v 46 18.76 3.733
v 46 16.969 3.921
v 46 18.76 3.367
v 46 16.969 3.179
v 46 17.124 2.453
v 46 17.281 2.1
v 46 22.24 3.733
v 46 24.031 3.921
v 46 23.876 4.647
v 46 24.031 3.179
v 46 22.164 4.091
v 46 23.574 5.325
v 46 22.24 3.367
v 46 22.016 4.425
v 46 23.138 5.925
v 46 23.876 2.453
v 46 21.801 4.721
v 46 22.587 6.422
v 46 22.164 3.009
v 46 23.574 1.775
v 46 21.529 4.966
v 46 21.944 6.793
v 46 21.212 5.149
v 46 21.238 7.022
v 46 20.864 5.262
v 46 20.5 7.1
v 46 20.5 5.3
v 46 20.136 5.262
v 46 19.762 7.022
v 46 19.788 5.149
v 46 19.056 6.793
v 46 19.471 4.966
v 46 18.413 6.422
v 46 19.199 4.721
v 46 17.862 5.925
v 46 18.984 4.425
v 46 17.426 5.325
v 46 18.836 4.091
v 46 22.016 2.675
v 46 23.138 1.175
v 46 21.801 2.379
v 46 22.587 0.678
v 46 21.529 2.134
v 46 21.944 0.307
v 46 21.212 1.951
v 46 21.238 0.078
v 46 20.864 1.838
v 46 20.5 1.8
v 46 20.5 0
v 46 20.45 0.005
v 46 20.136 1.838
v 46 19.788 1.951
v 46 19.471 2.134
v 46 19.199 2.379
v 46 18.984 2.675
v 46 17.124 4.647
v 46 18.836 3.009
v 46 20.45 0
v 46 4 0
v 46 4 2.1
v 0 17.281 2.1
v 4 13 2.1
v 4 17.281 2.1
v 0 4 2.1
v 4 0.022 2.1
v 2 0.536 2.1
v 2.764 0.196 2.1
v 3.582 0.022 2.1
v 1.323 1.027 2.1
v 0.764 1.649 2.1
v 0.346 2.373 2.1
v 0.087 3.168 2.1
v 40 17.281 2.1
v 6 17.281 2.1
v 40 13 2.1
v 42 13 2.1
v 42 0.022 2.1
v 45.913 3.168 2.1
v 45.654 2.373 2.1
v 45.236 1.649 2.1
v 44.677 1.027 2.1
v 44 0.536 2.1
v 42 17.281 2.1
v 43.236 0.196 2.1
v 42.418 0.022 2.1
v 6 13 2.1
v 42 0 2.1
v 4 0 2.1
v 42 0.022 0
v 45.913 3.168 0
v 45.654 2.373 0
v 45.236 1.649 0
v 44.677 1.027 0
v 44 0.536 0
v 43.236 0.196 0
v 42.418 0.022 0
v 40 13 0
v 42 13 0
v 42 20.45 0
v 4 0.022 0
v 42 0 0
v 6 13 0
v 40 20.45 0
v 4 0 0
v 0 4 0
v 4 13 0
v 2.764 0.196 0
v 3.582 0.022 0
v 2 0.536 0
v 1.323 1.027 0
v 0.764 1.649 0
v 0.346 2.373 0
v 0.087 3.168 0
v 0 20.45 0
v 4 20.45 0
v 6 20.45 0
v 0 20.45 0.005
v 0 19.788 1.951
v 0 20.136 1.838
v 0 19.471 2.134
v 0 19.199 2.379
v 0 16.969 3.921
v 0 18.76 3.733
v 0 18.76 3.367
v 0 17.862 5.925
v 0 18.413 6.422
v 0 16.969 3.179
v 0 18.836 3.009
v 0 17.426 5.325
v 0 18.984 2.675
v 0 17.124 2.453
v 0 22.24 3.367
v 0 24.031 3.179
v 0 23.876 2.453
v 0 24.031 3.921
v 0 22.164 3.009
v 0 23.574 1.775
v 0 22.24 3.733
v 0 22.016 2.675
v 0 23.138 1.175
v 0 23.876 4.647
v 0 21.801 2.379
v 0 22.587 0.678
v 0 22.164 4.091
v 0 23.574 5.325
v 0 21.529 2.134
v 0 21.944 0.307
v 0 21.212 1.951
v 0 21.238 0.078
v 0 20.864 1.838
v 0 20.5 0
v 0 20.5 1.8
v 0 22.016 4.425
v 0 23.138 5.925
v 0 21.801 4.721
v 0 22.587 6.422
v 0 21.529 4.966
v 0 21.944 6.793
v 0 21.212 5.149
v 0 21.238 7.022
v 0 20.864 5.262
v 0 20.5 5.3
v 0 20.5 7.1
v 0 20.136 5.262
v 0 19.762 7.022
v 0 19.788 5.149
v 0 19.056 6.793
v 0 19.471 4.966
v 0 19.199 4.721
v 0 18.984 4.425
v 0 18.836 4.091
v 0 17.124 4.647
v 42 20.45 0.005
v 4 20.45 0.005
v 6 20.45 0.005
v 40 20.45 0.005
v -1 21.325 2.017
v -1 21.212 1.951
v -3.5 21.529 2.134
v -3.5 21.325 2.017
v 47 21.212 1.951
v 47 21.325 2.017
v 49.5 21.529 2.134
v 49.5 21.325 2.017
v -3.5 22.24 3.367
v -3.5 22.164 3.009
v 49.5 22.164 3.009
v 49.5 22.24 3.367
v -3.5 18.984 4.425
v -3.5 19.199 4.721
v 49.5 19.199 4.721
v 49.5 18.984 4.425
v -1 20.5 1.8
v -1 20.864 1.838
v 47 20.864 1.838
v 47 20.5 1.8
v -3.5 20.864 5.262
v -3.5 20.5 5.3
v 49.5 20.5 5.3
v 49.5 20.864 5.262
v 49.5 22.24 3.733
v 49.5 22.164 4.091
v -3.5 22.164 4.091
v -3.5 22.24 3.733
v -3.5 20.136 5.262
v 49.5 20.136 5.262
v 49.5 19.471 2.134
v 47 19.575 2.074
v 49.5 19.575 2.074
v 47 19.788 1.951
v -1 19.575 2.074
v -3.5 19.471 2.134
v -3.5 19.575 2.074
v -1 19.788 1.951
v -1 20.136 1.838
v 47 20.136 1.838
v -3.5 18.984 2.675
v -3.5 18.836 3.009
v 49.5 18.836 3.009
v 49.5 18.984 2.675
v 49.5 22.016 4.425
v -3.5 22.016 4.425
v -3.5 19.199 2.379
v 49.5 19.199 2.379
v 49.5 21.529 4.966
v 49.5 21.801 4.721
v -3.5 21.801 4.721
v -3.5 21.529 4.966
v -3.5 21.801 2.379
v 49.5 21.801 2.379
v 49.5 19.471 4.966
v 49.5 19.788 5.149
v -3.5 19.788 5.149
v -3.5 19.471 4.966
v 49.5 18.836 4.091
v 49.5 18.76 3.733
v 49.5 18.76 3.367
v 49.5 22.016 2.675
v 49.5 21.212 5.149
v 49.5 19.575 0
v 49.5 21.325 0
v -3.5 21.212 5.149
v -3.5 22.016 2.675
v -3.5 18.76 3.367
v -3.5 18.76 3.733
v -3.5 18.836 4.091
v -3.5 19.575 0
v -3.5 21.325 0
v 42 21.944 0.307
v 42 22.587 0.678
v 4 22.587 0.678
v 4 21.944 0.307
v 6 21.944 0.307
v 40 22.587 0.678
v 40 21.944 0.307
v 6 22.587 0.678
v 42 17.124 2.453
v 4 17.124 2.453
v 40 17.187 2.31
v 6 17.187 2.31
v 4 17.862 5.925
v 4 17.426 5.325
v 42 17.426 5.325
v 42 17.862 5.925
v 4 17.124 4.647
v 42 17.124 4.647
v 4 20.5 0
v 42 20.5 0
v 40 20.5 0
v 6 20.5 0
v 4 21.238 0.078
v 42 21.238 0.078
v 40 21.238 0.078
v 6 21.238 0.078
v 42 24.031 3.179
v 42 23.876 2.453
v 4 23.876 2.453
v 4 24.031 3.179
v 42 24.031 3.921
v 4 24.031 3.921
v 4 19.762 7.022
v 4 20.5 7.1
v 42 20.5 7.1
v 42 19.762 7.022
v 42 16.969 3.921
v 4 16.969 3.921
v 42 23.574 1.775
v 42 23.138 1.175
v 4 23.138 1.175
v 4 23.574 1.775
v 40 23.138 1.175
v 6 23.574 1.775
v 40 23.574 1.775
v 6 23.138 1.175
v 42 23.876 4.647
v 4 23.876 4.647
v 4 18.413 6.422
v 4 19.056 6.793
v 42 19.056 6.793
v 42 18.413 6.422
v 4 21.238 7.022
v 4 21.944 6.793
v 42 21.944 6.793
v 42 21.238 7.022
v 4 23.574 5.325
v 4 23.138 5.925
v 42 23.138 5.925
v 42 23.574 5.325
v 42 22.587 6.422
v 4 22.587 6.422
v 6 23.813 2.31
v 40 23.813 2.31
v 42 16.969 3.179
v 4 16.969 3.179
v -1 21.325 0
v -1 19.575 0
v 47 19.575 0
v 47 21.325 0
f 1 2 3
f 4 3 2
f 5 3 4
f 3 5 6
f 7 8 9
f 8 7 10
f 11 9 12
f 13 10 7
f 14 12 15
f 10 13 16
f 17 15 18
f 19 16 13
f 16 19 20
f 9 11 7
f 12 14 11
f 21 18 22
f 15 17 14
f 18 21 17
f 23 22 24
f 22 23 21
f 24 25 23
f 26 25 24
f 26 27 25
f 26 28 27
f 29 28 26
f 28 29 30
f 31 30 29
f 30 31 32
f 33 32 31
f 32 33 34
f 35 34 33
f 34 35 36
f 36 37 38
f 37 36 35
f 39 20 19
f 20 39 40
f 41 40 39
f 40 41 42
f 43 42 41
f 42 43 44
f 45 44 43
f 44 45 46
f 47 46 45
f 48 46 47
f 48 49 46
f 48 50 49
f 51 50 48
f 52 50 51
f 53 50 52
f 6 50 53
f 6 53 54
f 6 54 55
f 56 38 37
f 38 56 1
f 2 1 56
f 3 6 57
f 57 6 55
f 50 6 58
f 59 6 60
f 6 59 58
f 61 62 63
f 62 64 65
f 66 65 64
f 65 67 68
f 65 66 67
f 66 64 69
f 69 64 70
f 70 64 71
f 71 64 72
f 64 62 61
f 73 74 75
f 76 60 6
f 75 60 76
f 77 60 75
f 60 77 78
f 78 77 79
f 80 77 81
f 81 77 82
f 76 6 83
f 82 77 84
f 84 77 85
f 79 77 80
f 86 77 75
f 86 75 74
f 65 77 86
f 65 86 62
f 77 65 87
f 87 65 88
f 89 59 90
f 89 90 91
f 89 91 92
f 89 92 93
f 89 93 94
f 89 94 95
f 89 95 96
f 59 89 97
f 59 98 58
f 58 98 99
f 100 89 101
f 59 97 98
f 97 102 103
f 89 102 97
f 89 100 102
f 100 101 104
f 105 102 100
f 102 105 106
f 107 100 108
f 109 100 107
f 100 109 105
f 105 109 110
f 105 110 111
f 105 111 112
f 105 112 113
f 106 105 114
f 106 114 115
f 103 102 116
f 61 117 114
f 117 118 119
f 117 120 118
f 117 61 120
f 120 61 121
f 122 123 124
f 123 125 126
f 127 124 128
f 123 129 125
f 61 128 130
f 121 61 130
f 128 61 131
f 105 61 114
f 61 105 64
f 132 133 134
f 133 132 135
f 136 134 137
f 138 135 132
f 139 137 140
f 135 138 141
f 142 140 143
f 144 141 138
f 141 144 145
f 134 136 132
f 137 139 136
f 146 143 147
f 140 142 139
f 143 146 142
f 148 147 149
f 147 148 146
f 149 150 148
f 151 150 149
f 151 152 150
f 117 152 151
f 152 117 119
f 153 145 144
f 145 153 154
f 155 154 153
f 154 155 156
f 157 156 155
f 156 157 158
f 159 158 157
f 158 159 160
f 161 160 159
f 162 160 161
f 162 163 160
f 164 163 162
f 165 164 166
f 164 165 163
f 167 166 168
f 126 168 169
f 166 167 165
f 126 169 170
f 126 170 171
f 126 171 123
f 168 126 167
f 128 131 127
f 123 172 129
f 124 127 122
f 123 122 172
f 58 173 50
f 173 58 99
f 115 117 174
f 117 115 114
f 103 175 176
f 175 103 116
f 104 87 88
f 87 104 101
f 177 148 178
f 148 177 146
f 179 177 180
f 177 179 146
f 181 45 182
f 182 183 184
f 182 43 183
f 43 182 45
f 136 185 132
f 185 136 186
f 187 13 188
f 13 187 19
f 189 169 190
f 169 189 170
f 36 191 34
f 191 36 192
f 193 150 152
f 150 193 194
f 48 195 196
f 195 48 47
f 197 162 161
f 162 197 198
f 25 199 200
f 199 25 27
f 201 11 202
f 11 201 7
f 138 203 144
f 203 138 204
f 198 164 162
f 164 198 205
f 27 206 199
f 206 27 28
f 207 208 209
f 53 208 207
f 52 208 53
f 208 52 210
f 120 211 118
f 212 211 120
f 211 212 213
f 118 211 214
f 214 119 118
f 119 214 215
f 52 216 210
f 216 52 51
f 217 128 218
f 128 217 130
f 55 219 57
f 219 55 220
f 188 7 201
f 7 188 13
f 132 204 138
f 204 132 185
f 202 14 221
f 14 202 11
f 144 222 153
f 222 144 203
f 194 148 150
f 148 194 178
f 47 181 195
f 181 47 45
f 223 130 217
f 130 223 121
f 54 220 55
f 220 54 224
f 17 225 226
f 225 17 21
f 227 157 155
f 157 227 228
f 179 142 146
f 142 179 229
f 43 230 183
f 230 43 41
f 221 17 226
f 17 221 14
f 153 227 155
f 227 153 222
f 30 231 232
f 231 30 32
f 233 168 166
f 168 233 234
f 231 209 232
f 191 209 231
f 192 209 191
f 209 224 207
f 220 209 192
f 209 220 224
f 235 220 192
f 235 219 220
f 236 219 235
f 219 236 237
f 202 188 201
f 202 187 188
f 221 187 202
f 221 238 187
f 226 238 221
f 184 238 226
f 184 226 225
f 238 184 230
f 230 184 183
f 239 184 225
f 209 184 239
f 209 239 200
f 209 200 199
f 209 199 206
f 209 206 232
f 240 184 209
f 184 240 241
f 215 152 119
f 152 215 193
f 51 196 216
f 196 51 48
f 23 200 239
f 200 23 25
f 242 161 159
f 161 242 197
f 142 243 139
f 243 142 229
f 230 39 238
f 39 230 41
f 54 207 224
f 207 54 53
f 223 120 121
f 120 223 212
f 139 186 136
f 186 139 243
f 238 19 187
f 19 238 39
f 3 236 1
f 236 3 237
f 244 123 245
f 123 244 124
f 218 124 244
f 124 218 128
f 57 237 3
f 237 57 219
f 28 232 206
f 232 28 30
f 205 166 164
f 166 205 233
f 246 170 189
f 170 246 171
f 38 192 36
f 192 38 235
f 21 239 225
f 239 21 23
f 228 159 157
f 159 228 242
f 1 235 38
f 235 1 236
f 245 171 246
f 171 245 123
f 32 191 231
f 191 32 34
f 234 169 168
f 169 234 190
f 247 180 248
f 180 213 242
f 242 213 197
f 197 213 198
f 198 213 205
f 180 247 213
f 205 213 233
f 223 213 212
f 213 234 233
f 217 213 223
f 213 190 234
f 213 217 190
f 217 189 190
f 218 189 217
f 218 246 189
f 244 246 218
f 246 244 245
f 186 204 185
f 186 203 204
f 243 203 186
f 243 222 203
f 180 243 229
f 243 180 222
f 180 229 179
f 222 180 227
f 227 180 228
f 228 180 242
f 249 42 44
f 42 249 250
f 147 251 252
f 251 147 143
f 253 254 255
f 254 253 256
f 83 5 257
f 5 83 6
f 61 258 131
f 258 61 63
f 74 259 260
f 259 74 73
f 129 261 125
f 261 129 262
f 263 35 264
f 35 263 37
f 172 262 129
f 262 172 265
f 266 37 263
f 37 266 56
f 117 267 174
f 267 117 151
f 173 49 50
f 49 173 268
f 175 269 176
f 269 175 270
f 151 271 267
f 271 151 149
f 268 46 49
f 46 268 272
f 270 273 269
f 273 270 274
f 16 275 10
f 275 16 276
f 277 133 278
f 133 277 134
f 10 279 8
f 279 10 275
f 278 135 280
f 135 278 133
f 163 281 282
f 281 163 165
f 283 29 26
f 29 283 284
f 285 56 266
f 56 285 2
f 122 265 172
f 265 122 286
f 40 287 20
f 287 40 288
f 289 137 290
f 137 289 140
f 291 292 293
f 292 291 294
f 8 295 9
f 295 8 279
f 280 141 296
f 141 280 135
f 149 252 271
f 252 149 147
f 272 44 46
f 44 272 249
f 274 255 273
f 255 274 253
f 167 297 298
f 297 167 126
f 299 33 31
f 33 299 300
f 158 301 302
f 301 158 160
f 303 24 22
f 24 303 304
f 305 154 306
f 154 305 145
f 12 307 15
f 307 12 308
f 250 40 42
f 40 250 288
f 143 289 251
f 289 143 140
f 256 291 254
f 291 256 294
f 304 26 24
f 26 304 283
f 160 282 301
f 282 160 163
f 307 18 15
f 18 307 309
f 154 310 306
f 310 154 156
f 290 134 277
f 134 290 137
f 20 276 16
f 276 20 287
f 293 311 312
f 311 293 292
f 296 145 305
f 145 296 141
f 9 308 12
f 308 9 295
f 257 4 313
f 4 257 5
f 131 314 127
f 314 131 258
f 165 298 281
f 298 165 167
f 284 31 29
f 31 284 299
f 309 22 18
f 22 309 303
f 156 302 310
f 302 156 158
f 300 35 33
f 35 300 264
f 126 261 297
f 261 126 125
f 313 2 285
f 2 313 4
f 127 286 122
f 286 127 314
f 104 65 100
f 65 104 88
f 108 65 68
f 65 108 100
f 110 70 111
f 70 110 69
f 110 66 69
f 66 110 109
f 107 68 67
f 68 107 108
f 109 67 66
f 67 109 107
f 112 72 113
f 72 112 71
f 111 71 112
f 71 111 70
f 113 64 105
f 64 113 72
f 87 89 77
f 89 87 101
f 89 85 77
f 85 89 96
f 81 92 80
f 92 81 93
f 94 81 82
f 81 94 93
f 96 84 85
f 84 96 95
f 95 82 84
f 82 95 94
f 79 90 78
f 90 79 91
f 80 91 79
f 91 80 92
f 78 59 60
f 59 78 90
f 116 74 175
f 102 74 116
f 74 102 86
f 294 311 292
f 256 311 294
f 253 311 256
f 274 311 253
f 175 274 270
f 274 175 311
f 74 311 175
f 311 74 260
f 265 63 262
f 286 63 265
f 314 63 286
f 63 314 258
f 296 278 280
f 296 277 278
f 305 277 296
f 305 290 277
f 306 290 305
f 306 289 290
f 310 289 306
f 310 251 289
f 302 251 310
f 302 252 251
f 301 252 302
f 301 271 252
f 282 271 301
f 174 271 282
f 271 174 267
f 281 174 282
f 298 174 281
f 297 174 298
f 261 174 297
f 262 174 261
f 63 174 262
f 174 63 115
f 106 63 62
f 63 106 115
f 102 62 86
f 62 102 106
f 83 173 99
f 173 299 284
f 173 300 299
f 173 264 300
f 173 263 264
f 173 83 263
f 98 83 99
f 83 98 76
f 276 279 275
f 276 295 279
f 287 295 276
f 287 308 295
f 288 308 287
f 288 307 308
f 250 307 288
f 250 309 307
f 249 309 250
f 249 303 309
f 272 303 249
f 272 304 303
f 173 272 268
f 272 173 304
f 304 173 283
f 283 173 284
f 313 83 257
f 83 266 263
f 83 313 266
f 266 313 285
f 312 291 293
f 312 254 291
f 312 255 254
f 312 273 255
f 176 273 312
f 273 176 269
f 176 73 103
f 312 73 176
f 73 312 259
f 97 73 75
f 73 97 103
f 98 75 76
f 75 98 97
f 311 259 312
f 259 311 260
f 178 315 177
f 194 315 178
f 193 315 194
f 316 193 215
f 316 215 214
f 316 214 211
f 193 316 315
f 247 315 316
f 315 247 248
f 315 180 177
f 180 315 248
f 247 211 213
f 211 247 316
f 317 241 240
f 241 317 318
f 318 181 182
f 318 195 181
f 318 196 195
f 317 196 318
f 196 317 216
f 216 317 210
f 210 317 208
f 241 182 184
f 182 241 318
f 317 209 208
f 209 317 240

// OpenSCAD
//Length of Leg
Length=46;
//Depth of Leg
Depth=24;
//Thickness at narrow side
Thickness=2.1;
//Corner radius
Corner_Radius=4;
//Length of cut away section
Leg_Length=11;
//Width of cut away section
Leg_Width=4;
// Complete height of leg
Total_Height=5.3;
//Diameter of pin
Pin_Diameter=3.5;
//Length of pin
Pin_Length=3.5;
//Height of pinn from bottom of foot
Pin_Height=1.8;
//Gap for pin support structure
Pin_Support_Gap=1;

difference(){
	union(){
		cube([Length,Depth-Pin_Diameter/2-Pin_Height,Thickness]);
		translate([-Pin_Length,Depth-Pin_Length,Pin_Height+Pin_Diameter/2])rotate(a=[0,90-0])cylinder(r=Pin_Diameter/2,h=Length+Pin_Length*2,$fn=30);
		translate([0,Depth-Pin_Length,Pin_Height+Pin_Diameter/2])rotate(a=[0,90-0])cylinder(r=Pin_Diameter/2+Pin_Height,h=Length,$fn=30);
	}
	difference(){
		translate([-Thickness,-Thickness,-Thickness/2])cube([Corner_Radius+Thickness,Corner_Radius+Thickness,Thickness*2]);
		translate([Corner_Radius,Corner_Radius,-Thickness])cylinder(r=Corner_Radius,h=Thickness*3,$fn=30);
	}
	translate([Length,0,0]){
		mirror([1,0,0]){
			difference(){
				translate([-Thickness,-Thickness,-Thickness/2])cube([Corner_Radius+Thickness,Corner_Radius+Thickness,Thickness*2]);
				translate([Corner_Radius,Corner_Radius,-Thickness])cylinder(r=Corner_Radius,h=Thickness*3,$fn=30);
			}
		}
	}
	translate([Leg_Width,Depth-Leg_Length,-Total_Height])cube([Leg_Width/2,Leg_Length*2,Total_Height*2+Pin_Diameter+Pin_Height*2]);
	translate([Length-Leg_Width*1.5,Depth-Leg_Length,-Total_Height])cube([Leg_Width/2,Leg_Length*2,Total_Height*2+Pin_Diameter+Pin_Height*2]);
	translate([Leg_Width,Leg_Width,Thickness*1.1])cube([Length-Leg_Width*2,Depth,Pin_Diameter+Pin_Height*2]);
}
translate([-Pin_Length,Depth-Pin_Diameter*.75-Pin_Height,0])cube([Pin_Length-Pin_Support_Gap,Pin_Diameter/2,Pin_Diameter/2+Pin_Height]);
translate([Length+Pin_Support_Gap,Depth-Pin_Diameter*.75-Pin_Height,0])cube([Pin_Length-Pin_Support_Gap,Pin_Diameter/2,Pin_Diameter/2+Pin_Height]);
